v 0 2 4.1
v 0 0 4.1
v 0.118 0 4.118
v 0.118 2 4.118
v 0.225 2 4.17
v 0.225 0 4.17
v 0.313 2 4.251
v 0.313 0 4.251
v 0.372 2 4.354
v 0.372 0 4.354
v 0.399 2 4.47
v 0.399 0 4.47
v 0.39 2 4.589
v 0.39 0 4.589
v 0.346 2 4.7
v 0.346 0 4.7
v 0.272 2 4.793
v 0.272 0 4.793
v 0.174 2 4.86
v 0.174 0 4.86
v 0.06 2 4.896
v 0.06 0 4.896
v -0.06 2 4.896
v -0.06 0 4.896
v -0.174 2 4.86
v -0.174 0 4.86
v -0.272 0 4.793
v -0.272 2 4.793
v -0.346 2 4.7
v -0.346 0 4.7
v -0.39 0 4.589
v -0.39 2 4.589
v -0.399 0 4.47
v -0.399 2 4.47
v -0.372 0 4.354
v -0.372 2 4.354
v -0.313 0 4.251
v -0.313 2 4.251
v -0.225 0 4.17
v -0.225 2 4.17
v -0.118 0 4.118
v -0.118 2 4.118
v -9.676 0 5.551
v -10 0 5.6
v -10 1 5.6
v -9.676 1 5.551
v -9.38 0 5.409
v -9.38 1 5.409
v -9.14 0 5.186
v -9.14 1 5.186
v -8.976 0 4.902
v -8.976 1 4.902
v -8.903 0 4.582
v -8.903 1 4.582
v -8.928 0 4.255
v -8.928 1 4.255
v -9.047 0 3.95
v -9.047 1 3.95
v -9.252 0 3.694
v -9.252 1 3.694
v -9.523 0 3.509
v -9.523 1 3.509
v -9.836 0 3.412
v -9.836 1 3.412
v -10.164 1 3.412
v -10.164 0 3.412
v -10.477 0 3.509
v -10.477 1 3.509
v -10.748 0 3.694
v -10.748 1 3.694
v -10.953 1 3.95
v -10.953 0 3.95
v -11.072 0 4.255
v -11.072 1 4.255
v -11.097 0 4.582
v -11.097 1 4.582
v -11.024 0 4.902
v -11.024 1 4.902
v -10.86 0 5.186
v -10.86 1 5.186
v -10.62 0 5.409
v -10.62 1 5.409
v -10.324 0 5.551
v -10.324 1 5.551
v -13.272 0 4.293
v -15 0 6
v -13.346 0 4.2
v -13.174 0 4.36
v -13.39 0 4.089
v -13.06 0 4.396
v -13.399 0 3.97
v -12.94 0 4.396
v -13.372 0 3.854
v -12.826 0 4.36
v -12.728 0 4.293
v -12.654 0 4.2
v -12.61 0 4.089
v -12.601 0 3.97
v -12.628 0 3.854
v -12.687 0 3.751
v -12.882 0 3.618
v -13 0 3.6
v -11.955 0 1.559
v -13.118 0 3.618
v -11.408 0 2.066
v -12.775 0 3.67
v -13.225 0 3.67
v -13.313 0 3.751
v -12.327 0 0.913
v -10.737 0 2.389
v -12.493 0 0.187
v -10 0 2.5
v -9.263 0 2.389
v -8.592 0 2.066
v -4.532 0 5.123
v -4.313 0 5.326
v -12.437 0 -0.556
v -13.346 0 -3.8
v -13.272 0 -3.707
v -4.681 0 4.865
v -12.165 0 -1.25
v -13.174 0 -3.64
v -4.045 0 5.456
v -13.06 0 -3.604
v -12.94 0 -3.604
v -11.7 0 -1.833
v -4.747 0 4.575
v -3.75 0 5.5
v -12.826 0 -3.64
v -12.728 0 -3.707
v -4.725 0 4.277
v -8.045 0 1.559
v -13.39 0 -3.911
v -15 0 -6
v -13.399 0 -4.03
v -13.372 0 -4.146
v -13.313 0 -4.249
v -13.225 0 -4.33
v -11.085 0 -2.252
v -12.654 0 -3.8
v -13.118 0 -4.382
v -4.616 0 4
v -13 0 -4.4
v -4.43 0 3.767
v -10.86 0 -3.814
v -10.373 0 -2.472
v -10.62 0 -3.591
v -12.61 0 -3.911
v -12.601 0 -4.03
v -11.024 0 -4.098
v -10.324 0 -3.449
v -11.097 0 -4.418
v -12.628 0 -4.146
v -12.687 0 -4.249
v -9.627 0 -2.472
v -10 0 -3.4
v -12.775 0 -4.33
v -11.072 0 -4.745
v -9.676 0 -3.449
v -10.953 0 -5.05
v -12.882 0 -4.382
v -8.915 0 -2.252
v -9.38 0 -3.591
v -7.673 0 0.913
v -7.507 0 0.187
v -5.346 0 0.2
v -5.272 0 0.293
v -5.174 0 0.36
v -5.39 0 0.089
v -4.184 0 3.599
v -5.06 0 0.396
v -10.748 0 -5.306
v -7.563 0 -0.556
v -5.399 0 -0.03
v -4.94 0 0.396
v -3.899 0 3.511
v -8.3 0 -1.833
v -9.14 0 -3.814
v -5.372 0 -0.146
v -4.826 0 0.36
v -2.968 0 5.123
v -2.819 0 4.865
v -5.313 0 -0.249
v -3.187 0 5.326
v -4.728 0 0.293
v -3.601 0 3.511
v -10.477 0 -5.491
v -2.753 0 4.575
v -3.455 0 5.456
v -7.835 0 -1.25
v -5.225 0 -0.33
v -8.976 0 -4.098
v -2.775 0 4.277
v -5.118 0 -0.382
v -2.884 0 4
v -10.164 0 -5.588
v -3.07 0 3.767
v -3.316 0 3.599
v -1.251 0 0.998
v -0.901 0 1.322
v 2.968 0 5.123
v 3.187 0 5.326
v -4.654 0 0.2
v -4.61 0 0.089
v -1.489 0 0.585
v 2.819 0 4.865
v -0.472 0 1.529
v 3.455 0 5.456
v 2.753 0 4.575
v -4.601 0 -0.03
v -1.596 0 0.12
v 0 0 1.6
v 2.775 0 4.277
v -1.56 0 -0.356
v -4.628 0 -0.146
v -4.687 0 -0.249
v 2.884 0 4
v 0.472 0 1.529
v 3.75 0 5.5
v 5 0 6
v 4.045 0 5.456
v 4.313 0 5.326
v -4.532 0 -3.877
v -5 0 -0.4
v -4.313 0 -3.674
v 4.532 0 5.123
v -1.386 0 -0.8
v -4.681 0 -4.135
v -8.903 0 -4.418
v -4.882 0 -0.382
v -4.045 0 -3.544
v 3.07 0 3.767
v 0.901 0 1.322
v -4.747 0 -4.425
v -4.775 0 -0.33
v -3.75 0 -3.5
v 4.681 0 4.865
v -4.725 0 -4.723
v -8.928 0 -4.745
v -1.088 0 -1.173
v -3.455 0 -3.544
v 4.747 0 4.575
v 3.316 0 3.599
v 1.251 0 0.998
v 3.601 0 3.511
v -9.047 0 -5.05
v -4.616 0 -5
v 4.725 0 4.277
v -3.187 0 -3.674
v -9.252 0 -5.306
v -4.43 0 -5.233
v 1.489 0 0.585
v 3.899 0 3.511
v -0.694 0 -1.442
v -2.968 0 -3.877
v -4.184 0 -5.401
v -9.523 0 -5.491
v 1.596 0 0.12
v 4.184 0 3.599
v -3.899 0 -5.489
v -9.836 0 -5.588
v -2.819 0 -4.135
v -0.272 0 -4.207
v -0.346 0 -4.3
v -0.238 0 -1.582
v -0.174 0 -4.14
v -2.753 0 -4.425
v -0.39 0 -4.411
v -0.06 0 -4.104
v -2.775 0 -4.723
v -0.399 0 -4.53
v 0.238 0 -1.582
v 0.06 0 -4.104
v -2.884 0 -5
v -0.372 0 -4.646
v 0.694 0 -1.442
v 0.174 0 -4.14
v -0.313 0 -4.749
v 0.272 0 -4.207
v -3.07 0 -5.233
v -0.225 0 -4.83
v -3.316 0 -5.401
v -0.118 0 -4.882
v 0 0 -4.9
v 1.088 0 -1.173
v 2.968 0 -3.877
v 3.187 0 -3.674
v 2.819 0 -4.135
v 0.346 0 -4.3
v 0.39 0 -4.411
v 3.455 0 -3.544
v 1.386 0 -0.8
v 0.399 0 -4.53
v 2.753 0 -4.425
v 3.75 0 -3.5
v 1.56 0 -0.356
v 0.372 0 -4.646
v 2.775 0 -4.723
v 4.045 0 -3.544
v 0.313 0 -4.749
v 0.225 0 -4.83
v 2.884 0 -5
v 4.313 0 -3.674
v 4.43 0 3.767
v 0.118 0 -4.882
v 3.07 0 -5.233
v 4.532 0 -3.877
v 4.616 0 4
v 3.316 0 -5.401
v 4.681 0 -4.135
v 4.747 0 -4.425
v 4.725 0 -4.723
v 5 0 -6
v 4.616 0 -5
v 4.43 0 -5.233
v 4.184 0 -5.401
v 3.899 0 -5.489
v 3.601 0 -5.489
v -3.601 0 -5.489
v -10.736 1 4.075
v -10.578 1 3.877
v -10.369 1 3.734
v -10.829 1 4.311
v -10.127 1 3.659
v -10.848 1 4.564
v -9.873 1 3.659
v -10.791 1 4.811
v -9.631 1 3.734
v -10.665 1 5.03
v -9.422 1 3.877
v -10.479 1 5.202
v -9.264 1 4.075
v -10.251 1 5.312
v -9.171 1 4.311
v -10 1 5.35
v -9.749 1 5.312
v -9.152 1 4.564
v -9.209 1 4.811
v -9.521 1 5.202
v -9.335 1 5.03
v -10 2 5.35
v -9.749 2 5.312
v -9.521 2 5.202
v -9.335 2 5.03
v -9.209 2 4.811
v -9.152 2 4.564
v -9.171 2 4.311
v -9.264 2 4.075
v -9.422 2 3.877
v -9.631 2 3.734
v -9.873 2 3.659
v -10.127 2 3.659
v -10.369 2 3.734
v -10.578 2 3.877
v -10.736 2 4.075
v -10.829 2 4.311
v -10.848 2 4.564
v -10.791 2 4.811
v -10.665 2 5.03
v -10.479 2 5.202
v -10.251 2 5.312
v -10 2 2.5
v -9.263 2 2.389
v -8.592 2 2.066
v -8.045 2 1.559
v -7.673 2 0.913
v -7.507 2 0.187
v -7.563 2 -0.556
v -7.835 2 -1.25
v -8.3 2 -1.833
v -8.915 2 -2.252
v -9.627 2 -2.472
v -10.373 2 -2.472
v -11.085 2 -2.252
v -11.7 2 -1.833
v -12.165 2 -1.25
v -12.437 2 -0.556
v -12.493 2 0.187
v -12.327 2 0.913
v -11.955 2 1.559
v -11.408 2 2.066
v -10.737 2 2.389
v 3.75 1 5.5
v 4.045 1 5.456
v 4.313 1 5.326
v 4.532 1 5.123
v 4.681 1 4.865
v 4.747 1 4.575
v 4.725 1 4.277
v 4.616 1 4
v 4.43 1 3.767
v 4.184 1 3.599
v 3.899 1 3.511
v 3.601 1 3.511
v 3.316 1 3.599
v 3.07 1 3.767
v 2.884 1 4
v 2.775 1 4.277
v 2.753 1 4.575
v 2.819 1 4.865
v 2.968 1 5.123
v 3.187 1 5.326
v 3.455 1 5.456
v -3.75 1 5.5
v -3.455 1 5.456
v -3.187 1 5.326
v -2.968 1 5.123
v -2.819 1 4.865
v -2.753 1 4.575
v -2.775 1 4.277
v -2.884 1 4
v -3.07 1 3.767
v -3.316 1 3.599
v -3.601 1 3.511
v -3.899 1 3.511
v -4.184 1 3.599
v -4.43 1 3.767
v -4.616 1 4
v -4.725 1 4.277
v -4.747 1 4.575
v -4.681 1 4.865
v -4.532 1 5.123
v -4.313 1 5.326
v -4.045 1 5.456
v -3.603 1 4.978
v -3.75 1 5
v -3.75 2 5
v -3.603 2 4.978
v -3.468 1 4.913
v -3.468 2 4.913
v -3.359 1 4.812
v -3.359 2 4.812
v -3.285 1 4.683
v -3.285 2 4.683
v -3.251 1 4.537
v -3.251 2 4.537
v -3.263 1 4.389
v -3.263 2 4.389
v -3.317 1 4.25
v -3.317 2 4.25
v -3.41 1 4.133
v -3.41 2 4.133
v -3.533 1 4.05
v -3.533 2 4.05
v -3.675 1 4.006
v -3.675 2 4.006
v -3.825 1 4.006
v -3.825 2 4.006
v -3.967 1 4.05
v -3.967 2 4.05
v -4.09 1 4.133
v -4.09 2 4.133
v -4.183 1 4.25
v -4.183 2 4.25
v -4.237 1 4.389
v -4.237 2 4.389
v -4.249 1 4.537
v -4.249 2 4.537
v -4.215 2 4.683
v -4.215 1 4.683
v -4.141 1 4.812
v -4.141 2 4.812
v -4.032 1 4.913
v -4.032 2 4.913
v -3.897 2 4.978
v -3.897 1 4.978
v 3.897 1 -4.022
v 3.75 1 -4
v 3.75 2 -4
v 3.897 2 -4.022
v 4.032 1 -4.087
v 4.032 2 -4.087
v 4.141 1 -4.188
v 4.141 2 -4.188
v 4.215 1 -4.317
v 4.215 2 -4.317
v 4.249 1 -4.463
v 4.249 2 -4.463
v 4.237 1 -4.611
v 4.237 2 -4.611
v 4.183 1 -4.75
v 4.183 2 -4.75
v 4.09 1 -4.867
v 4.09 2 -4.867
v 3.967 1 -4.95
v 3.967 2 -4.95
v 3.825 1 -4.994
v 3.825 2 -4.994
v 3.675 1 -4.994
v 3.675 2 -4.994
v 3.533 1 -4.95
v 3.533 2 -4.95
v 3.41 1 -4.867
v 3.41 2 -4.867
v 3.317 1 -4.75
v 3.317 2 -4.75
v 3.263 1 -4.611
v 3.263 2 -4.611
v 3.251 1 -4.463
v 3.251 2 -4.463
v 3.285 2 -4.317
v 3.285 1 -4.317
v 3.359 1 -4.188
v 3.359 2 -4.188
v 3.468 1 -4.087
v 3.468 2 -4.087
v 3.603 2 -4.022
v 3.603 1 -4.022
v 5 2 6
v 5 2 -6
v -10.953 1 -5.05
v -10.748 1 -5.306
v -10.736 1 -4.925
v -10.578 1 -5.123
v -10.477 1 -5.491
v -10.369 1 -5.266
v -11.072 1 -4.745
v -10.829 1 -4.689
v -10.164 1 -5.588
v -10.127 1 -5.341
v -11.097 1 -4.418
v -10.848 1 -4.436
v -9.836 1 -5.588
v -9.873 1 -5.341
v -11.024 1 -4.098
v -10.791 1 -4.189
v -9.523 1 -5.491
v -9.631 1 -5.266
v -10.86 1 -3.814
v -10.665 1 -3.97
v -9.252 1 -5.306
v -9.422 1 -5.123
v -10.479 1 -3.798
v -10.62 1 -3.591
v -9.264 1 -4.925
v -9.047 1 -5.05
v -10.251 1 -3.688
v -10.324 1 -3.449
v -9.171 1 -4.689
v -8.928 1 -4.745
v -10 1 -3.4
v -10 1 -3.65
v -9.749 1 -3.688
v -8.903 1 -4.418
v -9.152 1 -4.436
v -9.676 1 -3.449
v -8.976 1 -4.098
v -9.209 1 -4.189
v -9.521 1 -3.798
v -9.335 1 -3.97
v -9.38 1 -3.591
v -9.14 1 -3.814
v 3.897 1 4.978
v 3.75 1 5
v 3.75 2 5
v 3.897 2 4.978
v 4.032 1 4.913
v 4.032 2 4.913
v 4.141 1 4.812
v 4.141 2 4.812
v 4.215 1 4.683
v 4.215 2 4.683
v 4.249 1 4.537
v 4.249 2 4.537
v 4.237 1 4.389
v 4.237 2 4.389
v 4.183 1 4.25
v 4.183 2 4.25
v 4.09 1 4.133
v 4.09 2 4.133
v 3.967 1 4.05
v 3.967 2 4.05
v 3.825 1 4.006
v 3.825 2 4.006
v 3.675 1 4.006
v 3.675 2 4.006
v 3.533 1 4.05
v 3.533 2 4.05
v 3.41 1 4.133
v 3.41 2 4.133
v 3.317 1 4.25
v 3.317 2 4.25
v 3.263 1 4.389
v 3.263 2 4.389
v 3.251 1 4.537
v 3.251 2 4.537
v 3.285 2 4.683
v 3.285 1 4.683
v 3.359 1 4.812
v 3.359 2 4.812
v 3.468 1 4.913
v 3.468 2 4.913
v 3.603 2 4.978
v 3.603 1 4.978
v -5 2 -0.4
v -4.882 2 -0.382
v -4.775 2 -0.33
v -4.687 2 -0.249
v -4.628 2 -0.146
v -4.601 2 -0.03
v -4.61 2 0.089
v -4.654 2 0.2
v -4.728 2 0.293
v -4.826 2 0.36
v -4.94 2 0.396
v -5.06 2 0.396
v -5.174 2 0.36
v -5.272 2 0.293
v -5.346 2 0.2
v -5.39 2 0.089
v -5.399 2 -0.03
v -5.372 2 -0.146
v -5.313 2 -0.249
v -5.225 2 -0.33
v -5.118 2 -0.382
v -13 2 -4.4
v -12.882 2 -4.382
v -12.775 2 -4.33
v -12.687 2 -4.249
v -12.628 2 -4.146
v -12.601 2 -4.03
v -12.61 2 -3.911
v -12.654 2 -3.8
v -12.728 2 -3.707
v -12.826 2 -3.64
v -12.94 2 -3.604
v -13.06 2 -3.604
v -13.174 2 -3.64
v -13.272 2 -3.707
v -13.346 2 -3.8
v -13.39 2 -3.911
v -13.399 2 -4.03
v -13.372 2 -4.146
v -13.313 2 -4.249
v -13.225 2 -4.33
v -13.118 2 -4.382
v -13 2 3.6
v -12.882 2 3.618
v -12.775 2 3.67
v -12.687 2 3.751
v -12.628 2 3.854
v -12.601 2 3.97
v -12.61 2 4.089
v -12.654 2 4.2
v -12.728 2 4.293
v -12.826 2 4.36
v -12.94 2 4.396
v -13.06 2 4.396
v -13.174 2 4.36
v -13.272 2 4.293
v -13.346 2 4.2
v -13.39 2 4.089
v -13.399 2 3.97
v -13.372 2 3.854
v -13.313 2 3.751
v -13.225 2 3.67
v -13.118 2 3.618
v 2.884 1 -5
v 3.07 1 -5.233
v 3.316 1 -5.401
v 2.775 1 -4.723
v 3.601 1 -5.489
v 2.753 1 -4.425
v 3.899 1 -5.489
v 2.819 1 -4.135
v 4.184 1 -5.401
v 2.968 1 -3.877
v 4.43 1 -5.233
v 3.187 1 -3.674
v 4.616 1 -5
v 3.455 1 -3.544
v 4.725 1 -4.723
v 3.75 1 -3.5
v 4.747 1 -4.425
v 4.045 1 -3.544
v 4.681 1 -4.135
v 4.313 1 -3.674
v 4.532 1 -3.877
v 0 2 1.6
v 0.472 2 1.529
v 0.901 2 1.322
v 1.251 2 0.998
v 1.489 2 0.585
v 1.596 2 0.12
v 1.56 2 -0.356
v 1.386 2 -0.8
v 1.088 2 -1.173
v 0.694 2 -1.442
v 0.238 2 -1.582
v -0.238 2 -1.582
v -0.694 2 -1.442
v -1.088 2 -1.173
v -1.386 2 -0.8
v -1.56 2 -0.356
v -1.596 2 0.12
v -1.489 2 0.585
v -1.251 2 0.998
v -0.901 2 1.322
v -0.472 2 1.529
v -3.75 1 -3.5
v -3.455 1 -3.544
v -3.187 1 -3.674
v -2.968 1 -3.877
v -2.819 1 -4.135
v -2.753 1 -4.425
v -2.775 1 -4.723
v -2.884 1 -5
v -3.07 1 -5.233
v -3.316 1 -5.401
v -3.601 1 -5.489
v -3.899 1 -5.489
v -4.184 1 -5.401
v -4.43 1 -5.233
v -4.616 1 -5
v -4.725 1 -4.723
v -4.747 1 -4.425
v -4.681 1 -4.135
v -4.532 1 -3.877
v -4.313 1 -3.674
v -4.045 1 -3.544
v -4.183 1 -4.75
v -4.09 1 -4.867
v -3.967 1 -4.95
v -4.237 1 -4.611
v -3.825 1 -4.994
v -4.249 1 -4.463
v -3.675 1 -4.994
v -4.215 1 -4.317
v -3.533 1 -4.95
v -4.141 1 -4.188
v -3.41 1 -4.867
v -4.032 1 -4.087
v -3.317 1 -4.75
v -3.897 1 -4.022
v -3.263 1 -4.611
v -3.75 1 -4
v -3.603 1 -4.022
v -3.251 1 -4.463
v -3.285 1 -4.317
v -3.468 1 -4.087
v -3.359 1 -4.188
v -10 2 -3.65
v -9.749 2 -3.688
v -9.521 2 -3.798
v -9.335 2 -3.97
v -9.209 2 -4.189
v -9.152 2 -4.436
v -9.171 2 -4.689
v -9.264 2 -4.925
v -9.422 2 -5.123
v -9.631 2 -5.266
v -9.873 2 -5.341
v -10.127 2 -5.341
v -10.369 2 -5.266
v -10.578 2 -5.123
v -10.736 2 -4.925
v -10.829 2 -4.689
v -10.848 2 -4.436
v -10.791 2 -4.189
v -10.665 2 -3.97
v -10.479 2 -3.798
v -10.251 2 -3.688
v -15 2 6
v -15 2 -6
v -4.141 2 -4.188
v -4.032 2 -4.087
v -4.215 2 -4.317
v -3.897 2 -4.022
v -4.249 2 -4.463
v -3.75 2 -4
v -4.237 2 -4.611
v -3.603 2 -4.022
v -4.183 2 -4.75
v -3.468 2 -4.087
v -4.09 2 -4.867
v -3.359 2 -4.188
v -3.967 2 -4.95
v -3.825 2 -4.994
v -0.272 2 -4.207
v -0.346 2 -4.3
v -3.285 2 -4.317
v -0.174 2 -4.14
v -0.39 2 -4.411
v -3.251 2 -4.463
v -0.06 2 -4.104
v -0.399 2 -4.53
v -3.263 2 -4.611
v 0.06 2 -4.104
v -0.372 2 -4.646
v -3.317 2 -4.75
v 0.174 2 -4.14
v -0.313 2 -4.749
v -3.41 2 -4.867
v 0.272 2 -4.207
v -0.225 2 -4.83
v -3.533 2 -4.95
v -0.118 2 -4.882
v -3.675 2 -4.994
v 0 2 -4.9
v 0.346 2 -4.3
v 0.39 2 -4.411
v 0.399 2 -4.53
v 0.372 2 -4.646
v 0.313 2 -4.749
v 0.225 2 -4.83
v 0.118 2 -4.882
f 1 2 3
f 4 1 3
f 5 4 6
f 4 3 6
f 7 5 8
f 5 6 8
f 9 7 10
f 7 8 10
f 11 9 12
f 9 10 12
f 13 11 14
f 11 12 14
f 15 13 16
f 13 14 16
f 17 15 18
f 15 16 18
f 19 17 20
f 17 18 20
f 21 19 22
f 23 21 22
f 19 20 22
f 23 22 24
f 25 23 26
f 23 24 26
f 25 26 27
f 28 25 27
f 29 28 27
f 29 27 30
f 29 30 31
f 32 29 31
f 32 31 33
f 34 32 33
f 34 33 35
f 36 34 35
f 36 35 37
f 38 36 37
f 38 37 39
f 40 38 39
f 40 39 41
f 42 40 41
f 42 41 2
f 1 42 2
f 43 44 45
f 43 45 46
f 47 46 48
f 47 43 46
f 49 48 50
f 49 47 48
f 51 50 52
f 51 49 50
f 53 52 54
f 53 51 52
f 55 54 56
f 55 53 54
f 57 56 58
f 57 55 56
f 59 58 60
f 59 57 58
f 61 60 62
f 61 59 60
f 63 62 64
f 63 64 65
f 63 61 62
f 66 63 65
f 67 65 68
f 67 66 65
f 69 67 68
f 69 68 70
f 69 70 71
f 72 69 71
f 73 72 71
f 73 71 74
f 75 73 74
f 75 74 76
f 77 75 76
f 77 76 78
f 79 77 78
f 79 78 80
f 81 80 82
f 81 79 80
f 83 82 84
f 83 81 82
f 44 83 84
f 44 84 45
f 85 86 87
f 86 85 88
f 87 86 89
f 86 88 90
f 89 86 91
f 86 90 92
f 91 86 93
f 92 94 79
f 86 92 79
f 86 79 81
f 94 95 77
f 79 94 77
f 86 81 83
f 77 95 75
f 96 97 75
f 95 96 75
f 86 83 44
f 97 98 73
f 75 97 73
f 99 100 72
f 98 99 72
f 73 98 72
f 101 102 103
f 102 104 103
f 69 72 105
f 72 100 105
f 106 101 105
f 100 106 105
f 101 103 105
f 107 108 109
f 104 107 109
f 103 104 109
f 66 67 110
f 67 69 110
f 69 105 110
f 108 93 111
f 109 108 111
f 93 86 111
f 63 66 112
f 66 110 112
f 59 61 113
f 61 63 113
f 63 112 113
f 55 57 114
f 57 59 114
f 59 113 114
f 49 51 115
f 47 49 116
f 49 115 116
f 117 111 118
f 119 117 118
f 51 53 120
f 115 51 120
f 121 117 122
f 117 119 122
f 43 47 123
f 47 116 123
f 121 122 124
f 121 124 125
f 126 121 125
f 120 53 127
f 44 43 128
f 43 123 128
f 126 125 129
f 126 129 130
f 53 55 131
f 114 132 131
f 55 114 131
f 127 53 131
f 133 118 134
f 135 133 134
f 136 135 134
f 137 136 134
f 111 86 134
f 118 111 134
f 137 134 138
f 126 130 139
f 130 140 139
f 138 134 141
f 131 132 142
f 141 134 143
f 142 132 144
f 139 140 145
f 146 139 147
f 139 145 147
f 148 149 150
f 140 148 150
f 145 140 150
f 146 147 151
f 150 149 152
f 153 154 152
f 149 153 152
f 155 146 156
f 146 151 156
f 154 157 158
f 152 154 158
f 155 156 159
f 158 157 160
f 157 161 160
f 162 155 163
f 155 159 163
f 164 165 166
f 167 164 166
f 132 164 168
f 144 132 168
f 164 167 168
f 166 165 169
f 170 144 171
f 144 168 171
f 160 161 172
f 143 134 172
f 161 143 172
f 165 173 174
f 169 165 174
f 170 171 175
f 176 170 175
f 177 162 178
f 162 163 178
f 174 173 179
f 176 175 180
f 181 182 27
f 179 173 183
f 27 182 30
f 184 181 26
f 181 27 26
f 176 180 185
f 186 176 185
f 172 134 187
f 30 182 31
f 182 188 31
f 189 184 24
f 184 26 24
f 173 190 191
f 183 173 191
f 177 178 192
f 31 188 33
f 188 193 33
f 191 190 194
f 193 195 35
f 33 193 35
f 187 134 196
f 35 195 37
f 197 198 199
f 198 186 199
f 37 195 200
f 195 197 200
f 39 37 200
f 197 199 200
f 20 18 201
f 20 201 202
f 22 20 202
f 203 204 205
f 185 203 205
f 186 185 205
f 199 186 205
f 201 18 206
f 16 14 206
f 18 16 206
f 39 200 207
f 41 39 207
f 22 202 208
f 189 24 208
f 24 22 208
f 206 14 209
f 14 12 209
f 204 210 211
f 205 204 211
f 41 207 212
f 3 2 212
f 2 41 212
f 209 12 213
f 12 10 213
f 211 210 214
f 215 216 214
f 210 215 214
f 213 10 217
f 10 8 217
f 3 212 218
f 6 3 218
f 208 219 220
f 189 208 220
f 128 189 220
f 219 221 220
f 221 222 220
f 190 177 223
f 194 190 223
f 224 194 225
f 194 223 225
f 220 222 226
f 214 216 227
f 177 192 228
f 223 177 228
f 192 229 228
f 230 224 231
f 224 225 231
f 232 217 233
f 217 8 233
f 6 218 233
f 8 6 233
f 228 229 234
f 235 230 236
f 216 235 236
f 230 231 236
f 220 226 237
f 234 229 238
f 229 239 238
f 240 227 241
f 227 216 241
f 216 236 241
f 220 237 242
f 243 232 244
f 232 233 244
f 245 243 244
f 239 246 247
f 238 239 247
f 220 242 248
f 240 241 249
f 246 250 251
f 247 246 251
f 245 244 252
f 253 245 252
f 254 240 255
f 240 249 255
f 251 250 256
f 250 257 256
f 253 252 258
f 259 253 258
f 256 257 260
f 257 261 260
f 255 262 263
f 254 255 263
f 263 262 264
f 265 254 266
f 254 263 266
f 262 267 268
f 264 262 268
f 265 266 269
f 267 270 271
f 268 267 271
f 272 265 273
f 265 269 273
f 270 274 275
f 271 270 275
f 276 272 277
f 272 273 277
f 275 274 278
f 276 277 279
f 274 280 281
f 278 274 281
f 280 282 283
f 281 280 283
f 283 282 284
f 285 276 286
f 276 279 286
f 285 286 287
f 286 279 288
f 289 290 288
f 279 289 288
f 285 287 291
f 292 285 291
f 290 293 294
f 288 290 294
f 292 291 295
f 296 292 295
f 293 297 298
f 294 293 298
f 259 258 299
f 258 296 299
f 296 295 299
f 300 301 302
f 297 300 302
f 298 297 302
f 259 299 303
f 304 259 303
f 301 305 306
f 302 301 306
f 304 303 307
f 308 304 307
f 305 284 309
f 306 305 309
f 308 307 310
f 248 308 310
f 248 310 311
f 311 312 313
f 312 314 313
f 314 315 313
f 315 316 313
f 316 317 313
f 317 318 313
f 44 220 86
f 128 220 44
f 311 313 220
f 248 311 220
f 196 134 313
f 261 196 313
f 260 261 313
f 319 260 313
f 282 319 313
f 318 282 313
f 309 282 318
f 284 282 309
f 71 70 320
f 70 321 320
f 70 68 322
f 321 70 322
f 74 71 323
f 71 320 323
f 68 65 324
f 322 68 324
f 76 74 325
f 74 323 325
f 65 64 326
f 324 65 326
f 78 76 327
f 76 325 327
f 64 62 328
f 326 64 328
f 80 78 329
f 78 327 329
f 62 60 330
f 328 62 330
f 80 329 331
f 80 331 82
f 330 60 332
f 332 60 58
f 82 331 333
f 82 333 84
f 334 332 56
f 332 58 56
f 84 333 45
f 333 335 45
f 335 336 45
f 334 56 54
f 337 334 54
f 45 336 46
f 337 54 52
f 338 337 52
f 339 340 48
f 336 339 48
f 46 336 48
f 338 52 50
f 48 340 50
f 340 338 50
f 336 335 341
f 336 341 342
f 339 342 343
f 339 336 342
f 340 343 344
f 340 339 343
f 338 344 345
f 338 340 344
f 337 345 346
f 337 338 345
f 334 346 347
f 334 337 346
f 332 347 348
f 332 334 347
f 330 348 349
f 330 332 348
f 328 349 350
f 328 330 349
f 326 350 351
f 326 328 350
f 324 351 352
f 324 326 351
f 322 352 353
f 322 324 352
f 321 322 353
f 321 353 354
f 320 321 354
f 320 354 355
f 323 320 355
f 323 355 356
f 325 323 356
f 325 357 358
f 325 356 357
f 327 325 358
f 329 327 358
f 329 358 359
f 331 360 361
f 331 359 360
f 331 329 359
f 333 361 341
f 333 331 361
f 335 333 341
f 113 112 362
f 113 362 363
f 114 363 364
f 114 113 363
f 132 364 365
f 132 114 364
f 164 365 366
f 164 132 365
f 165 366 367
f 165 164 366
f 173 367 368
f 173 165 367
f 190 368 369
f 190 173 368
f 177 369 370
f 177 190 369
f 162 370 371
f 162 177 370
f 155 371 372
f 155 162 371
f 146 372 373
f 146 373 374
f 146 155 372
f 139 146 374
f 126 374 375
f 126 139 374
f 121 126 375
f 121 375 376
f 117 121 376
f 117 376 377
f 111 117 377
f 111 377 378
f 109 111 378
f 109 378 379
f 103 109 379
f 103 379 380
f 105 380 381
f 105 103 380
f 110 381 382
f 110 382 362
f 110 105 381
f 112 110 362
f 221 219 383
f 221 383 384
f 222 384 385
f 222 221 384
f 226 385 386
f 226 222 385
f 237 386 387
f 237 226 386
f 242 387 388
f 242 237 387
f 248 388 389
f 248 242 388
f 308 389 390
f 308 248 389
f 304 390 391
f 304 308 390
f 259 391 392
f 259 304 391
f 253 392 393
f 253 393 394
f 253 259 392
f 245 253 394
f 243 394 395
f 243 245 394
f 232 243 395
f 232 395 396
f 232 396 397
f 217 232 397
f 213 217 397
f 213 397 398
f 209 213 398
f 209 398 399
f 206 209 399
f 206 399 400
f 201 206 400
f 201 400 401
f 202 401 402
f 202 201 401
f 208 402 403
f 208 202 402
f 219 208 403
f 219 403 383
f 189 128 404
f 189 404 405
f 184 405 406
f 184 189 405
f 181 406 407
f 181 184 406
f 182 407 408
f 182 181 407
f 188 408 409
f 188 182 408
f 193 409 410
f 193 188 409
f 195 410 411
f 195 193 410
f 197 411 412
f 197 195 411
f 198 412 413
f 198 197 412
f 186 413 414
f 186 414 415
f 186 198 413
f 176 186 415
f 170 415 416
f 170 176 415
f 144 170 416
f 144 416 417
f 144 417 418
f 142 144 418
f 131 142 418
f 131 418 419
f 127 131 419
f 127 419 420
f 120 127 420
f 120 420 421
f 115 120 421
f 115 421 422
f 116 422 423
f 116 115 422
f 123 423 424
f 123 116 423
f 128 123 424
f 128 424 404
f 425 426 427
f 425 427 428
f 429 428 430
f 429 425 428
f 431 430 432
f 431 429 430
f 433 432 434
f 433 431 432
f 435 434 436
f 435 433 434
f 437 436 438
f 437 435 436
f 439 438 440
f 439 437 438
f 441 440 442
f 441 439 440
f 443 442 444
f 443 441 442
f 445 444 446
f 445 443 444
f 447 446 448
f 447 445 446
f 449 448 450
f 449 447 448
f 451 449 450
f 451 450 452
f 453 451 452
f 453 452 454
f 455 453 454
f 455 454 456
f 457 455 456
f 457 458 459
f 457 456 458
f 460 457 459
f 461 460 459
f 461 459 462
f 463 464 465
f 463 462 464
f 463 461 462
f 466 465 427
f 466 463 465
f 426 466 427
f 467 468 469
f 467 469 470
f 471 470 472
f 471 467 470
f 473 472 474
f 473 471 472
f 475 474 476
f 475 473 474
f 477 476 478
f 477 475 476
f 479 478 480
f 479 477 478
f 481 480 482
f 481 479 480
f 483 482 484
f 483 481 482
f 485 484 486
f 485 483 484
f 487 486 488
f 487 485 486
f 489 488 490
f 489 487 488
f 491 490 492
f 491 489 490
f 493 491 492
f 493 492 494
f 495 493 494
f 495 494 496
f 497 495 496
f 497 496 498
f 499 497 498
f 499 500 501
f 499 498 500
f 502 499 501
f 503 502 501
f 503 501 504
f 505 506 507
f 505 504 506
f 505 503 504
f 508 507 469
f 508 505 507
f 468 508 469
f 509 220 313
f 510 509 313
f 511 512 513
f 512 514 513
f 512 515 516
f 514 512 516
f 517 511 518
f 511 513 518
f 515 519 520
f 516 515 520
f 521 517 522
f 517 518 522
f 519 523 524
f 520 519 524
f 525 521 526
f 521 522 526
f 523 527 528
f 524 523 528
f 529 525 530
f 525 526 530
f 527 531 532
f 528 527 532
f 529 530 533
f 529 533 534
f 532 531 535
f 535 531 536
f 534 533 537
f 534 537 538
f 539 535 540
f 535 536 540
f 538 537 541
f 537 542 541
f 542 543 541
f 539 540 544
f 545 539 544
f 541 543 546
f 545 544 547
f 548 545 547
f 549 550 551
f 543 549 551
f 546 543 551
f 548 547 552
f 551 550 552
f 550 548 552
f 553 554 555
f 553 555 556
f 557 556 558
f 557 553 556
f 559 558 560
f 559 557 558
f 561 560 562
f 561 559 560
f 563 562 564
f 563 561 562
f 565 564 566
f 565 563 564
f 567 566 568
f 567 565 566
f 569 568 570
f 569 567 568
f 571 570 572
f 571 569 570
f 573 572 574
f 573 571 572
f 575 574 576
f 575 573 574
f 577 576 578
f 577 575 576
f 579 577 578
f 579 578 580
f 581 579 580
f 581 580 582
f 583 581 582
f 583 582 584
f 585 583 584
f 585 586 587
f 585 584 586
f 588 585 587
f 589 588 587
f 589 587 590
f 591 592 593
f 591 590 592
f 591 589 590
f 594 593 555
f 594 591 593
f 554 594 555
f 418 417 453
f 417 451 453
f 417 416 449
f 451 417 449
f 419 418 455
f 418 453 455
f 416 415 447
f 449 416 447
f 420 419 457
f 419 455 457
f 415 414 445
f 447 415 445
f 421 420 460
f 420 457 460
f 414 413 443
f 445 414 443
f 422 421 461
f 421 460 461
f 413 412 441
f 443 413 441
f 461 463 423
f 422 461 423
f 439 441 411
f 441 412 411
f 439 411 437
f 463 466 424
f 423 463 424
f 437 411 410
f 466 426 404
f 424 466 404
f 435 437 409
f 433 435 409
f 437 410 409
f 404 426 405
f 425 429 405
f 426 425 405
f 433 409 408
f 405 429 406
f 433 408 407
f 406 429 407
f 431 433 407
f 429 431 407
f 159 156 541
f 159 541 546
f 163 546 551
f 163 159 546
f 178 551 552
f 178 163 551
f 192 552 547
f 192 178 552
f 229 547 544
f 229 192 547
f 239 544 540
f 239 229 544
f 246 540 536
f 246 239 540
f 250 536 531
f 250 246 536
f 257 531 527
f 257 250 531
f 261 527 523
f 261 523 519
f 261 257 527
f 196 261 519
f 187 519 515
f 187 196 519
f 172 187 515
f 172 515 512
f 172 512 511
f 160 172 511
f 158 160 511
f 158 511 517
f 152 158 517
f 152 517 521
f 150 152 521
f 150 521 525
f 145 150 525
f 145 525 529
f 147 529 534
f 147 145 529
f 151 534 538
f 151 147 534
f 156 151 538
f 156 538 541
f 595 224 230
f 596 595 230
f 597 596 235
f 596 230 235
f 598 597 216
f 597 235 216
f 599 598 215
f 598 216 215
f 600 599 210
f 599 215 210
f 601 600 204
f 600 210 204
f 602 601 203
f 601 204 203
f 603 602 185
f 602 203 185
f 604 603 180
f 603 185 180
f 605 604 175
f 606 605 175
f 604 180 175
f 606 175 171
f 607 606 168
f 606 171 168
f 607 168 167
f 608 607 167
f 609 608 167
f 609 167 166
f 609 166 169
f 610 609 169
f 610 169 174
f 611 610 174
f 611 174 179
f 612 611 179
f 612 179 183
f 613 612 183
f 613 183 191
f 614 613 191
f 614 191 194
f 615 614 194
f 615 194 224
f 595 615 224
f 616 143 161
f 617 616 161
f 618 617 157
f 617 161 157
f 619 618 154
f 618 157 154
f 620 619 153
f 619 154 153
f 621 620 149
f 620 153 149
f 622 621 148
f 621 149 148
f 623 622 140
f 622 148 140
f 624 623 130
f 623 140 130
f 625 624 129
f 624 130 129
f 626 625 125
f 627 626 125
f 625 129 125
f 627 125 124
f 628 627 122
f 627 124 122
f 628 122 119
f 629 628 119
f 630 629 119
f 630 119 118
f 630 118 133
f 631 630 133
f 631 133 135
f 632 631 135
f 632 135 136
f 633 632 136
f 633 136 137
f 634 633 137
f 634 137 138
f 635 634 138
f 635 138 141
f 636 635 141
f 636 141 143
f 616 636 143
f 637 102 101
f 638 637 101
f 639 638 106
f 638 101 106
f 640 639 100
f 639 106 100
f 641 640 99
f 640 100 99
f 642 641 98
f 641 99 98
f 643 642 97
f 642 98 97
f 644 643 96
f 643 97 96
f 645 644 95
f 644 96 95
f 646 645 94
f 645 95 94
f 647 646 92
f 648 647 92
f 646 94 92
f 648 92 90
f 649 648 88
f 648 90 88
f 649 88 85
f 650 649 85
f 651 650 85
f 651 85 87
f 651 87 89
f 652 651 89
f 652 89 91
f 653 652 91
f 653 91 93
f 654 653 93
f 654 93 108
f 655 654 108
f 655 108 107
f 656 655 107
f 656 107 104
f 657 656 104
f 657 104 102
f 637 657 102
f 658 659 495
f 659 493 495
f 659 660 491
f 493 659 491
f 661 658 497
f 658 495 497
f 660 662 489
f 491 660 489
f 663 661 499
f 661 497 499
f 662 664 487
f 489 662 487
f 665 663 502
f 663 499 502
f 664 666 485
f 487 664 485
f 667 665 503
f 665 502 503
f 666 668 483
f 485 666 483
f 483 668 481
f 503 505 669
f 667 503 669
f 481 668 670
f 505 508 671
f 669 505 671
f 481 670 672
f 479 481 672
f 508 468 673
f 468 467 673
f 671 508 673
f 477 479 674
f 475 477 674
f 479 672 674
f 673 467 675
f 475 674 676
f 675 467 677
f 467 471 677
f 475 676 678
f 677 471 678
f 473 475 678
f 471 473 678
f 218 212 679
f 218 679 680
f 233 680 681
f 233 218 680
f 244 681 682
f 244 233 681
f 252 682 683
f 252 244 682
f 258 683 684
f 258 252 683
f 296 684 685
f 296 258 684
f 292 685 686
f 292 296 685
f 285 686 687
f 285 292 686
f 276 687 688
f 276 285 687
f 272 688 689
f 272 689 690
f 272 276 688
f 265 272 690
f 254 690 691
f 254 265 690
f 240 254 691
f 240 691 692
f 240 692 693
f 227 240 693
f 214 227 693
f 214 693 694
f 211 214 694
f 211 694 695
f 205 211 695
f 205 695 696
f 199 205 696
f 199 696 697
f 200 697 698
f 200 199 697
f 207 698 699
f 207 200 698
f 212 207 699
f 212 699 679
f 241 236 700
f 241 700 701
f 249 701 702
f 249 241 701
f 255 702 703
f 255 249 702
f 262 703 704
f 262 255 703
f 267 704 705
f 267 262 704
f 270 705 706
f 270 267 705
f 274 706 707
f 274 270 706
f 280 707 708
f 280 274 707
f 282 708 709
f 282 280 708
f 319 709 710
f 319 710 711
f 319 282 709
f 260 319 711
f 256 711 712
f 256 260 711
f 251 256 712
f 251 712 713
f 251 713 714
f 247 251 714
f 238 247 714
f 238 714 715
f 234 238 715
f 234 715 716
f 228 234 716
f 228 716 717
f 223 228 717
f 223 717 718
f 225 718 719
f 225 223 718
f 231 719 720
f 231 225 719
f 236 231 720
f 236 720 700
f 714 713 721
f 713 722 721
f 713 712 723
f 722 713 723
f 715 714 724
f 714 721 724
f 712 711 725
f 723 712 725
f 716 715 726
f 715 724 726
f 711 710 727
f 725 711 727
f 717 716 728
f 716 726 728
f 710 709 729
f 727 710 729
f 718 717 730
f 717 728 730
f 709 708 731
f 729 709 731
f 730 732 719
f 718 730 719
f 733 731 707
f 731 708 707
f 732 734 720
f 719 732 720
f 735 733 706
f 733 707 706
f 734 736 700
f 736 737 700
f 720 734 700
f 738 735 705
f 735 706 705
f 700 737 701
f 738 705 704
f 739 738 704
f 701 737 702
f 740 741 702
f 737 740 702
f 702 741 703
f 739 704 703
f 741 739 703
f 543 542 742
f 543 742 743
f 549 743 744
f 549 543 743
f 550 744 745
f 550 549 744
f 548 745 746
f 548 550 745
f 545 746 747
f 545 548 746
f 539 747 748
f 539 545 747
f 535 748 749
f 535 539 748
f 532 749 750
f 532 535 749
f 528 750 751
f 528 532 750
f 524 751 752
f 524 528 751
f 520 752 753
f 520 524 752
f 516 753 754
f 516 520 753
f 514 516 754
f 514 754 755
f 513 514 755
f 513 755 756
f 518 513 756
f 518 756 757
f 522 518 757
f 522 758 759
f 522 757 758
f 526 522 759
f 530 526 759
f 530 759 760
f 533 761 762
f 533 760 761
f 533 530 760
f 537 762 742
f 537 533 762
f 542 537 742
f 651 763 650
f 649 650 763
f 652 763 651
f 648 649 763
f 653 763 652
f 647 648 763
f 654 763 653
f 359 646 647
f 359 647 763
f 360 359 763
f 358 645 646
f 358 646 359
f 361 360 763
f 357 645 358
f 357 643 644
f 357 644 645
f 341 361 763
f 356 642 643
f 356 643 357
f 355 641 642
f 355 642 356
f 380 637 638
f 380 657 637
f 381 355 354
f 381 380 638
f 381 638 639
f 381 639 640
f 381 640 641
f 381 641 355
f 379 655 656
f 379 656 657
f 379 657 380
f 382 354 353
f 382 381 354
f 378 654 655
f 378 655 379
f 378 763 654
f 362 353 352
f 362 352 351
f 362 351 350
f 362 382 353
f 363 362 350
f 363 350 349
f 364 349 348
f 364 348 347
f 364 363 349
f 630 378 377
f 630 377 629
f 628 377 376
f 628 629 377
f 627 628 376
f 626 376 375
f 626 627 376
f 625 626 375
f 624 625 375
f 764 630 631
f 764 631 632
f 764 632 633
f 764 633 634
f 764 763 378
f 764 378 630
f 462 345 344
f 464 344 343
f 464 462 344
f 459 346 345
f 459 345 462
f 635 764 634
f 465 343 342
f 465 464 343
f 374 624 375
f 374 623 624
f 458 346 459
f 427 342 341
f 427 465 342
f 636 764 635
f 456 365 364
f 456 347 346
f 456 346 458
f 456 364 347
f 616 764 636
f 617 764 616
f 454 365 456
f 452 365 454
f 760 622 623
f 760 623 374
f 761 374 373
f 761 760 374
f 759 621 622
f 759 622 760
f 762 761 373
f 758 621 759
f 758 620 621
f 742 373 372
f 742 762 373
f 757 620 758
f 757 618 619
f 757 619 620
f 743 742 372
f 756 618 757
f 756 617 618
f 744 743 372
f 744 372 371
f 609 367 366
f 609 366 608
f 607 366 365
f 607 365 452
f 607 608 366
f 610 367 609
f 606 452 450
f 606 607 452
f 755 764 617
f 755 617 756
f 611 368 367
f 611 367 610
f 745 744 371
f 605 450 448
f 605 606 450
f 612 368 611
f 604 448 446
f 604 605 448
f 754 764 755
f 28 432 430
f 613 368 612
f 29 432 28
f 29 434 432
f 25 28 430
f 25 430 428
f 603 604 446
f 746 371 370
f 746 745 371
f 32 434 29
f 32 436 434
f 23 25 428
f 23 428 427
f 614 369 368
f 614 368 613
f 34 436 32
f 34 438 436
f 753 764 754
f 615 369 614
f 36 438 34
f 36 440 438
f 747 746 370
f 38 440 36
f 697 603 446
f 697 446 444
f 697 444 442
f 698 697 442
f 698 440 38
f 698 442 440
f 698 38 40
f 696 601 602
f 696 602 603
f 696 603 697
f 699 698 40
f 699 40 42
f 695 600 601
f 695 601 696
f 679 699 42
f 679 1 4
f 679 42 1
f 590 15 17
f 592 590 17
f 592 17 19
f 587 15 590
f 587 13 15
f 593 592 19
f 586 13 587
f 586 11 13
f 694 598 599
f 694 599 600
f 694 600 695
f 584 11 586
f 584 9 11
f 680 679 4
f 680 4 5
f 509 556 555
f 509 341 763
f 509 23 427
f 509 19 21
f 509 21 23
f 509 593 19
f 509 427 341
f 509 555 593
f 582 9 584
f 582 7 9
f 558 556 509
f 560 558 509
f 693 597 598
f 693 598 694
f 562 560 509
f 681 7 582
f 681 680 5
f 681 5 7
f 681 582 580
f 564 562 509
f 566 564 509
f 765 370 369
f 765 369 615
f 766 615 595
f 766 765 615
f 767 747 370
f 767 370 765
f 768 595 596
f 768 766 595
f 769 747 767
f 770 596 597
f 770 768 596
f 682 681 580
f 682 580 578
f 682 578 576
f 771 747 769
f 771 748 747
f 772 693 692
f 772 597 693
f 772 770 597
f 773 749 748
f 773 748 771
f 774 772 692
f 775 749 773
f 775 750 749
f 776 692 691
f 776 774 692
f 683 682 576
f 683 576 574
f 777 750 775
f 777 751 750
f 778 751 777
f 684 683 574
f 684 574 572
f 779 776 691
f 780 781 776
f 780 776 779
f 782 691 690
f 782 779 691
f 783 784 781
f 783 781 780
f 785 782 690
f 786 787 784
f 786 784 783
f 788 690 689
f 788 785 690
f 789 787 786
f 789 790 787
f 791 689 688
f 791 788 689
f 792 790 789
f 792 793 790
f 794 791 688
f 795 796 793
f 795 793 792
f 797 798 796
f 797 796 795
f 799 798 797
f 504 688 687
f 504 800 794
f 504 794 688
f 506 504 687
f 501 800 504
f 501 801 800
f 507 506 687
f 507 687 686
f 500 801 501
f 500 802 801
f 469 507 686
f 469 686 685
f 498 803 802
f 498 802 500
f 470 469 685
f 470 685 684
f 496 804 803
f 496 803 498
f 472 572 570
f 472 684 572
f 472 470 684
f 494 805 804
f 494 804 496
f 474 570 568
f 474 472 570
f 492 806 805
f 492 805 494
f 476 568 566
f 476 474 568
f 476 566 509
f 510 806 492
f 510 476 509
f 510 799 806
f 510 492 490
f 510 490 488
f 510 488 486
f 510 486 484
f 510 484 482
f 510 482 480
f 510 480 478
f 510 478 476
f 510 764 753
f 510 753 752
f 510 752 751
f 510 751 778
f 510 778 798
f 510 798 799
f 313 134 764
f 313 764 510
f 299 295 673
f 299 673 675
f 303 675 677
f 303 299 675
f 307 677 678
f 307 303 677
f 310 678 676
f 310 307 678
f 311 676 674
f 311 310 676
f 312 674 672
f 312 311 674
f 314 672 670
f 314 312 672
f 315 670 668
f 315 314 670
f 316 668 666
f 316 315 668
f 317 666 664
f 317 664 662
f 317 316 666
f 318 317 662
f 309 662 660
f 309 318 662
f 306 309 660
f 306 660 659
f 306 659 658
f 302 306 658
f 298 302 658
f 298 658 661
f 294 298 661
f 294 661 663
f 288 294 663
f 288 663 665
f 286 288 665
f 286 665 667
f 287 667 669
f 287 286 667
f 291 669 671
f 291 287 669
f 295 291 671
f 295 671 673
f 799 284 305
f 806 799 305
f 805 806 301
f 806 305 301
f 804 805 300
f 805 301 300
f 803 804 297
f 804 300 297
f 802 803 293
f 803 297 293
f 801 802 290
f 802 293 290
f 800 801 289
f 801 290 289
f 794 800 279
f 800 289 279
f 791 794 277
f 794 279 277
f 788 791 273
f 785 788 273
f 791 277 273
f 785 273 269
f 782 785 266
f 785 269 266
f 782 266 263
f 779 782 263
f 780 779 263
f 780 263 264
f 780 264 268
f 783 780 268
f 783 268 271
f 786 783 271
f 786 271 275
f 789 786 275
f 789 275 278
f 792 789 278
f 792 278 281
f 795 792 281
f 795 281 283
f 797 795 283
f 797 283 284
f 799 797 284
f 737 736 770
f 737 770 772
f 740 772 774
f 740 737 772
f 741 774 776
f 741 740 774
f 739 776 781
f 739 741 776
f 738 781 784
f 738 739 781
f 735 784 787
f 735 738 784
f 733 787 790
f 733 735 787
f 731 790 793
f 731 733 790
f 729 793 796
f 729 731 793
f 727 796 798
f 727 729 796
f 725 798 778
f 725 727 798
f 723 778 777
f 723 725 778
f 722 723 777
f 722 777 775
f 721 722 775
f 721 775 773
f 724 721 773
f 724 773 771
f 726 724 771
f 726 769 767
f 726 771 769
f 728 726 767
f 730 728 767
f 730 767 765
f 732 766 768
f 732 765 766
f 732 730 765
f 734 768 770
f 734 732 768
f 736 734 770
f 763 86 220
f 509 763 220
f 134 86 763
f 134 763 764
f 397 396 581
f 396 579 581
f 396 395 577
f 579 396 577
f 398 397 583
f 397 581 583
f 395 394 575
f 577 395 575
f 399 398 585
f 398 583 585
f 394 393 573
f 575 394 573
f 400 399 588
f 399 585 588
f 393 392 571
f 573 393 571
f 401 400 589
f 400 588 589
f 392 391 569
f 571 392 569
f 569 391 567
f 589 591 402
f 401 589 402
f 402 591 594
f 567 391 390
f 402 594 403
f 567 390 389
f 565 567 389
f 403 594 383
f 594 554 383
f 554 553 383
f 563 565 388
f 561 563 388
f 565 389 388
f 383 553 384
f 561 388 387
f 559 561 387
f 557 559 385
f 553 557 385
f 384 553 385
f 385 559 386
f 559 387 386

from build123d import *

# Parameters (mm, degrees)
SKETCH_1_W          = 20
SKETCH_1_H          = 12
SKETCH_1_R          = 2.5
SKETCH_1_R_2        = 1.6
EXTRUDE_1_DEPTH     = 2
SKETCH_1_4_R        = 0.5
SKETCH_1_4_R_2      = 0.85
CUT_EXTRUDE_1_DEPTH = 17.278820596
SKETCH_1_5_R        = 1
SKETCH_1_5_R_2      = 1.1
CUT_EXTRUDE_2_DEPTH = 1
SKETCH_2_R          = 0.4
CUT_EXTRUDE_3_DEPTH = 17.278820596


with BuildPart() as part:
    # 草图1 → 凸台-拉伸1 (new body)
    with BuildSketch(Plane(origin=(0, 0, 0), x_dir=(1, 0, 0), z_dir=(0, 1, 0))):
        with Locations((-5, 0)):
            Rectangle(SKETCH_1_W, SKETCH_1_H)
        with Locations(Location((-10, 0, 0), (0, 0, 270))):
            Circle(SKETCH_1_R, mode=Mode.SUBTRACT)
        with Locations(Location((0, 0, 0), (0, 0, 270))):
            Circle(SKETCH_1_R_2, mode=Mode.SUBTRACT)
    extrude(amount=EXTRUDE_1_DEPTH)

    # 草图1<4> → 切除-拉伸1 (cut, through all)
    with BuildSketch(Plane(origin=(0, 0, 0), x_dir=(1, 0, 0), z_dir=(0, 1, 0))):
        with Locations(Location((-3.75, 4.5, 0), (0, 0, 270))):
            Circle(SKETCH_1_4_R)
        with Locations(Location((3.75, -4.5, 0), (0, 0, 270))):
            Circle(SKETCH_1_4_R)
        with Locations(Location((3.75, 4.5, 0), (0, 0, 270))):
            Circle(SKETCH_1_4_R)
        with Locations(Location((-3.75, -4.5, 0), (0, 0, 270))):
            Circle(SKETCH_1_4_R)
        with Locations(Location((-10, 4.5, 0), (0, 0, 270))):
            Circle(SKETCH_1_4_R_2)
        with Locations(Location((-10, -4.5, 0), (0, 0, 270))):
            Circle(SKETCH_1_4_R_2)
    extrude(amount=CUT_EXTRUDE_1_DEPTH, mode=Mode.SUBTRACT)

    # 草图1<5> → 切除-拉伸2 (cut)
    with BuildSketch(Plane(origin=(0, 0, 0), x_dir=(1, 0, 0), z_dir=(0, 1, 0))):
        with Locations(Location((-3.75, 4.5, 0), (0, 0, 270))):
            Circle(SKETCH_1_5_R)
        with Locations(Location((3.75, 4.5, 0), (0, 0, 270))):
            Circle(SKETCH_1_5_R)
        with Locations(Location((-3.75, -4.5, 0), (0, 0, 270))):
            Circle(SKETCH_1_5_R)
        with Locations(Location((3.75, -4.5, 0), (0, 0, 270))):
            Circle(SKETCH_1_5_R)
        with Locations(Location((-10, -4.5, 0), (0, 0, 270))):
            Circle(SKETCH_1_5_R_2)
        with Locations(Location((-10, 4.5, 0), (0, 0, 270))):
            Circle(SKETCH_1_5_R_2)
    extrude(amount=CUT_EXTRUDE_2_DEPTH, mode=Mode.SUBTRACT)

    # 草图2 → 切除-拉伸3 (cut, through all)
    with BuildSketch(Plane.XZ):
        with Locations(Location((-13, 4, 0), (0, 0, 270))):
            Circle(SKETCH_2_R)
        with Locations(Location((-5, 0, 0), (0, 0, 270))):
            Circle(SKETCH_2_R)
        with Locations(Location((-13, -4, 0), (0, 0, 270))):
            Circle(SKETCH_2_R)
        with Locations(Location((0, -4.5, 0), (0, 0, 270))):
            Circle(SKETCH_2_R)
        with Locations(Location((0, 4.5, 0), (0, 0, 270))):
            Circle(SKETCH_2_R)
    extrude(amount=-CUT_EXTRUDE_3_DEPTH, mode=Mode.SUBTRACT)


solid = part.part
